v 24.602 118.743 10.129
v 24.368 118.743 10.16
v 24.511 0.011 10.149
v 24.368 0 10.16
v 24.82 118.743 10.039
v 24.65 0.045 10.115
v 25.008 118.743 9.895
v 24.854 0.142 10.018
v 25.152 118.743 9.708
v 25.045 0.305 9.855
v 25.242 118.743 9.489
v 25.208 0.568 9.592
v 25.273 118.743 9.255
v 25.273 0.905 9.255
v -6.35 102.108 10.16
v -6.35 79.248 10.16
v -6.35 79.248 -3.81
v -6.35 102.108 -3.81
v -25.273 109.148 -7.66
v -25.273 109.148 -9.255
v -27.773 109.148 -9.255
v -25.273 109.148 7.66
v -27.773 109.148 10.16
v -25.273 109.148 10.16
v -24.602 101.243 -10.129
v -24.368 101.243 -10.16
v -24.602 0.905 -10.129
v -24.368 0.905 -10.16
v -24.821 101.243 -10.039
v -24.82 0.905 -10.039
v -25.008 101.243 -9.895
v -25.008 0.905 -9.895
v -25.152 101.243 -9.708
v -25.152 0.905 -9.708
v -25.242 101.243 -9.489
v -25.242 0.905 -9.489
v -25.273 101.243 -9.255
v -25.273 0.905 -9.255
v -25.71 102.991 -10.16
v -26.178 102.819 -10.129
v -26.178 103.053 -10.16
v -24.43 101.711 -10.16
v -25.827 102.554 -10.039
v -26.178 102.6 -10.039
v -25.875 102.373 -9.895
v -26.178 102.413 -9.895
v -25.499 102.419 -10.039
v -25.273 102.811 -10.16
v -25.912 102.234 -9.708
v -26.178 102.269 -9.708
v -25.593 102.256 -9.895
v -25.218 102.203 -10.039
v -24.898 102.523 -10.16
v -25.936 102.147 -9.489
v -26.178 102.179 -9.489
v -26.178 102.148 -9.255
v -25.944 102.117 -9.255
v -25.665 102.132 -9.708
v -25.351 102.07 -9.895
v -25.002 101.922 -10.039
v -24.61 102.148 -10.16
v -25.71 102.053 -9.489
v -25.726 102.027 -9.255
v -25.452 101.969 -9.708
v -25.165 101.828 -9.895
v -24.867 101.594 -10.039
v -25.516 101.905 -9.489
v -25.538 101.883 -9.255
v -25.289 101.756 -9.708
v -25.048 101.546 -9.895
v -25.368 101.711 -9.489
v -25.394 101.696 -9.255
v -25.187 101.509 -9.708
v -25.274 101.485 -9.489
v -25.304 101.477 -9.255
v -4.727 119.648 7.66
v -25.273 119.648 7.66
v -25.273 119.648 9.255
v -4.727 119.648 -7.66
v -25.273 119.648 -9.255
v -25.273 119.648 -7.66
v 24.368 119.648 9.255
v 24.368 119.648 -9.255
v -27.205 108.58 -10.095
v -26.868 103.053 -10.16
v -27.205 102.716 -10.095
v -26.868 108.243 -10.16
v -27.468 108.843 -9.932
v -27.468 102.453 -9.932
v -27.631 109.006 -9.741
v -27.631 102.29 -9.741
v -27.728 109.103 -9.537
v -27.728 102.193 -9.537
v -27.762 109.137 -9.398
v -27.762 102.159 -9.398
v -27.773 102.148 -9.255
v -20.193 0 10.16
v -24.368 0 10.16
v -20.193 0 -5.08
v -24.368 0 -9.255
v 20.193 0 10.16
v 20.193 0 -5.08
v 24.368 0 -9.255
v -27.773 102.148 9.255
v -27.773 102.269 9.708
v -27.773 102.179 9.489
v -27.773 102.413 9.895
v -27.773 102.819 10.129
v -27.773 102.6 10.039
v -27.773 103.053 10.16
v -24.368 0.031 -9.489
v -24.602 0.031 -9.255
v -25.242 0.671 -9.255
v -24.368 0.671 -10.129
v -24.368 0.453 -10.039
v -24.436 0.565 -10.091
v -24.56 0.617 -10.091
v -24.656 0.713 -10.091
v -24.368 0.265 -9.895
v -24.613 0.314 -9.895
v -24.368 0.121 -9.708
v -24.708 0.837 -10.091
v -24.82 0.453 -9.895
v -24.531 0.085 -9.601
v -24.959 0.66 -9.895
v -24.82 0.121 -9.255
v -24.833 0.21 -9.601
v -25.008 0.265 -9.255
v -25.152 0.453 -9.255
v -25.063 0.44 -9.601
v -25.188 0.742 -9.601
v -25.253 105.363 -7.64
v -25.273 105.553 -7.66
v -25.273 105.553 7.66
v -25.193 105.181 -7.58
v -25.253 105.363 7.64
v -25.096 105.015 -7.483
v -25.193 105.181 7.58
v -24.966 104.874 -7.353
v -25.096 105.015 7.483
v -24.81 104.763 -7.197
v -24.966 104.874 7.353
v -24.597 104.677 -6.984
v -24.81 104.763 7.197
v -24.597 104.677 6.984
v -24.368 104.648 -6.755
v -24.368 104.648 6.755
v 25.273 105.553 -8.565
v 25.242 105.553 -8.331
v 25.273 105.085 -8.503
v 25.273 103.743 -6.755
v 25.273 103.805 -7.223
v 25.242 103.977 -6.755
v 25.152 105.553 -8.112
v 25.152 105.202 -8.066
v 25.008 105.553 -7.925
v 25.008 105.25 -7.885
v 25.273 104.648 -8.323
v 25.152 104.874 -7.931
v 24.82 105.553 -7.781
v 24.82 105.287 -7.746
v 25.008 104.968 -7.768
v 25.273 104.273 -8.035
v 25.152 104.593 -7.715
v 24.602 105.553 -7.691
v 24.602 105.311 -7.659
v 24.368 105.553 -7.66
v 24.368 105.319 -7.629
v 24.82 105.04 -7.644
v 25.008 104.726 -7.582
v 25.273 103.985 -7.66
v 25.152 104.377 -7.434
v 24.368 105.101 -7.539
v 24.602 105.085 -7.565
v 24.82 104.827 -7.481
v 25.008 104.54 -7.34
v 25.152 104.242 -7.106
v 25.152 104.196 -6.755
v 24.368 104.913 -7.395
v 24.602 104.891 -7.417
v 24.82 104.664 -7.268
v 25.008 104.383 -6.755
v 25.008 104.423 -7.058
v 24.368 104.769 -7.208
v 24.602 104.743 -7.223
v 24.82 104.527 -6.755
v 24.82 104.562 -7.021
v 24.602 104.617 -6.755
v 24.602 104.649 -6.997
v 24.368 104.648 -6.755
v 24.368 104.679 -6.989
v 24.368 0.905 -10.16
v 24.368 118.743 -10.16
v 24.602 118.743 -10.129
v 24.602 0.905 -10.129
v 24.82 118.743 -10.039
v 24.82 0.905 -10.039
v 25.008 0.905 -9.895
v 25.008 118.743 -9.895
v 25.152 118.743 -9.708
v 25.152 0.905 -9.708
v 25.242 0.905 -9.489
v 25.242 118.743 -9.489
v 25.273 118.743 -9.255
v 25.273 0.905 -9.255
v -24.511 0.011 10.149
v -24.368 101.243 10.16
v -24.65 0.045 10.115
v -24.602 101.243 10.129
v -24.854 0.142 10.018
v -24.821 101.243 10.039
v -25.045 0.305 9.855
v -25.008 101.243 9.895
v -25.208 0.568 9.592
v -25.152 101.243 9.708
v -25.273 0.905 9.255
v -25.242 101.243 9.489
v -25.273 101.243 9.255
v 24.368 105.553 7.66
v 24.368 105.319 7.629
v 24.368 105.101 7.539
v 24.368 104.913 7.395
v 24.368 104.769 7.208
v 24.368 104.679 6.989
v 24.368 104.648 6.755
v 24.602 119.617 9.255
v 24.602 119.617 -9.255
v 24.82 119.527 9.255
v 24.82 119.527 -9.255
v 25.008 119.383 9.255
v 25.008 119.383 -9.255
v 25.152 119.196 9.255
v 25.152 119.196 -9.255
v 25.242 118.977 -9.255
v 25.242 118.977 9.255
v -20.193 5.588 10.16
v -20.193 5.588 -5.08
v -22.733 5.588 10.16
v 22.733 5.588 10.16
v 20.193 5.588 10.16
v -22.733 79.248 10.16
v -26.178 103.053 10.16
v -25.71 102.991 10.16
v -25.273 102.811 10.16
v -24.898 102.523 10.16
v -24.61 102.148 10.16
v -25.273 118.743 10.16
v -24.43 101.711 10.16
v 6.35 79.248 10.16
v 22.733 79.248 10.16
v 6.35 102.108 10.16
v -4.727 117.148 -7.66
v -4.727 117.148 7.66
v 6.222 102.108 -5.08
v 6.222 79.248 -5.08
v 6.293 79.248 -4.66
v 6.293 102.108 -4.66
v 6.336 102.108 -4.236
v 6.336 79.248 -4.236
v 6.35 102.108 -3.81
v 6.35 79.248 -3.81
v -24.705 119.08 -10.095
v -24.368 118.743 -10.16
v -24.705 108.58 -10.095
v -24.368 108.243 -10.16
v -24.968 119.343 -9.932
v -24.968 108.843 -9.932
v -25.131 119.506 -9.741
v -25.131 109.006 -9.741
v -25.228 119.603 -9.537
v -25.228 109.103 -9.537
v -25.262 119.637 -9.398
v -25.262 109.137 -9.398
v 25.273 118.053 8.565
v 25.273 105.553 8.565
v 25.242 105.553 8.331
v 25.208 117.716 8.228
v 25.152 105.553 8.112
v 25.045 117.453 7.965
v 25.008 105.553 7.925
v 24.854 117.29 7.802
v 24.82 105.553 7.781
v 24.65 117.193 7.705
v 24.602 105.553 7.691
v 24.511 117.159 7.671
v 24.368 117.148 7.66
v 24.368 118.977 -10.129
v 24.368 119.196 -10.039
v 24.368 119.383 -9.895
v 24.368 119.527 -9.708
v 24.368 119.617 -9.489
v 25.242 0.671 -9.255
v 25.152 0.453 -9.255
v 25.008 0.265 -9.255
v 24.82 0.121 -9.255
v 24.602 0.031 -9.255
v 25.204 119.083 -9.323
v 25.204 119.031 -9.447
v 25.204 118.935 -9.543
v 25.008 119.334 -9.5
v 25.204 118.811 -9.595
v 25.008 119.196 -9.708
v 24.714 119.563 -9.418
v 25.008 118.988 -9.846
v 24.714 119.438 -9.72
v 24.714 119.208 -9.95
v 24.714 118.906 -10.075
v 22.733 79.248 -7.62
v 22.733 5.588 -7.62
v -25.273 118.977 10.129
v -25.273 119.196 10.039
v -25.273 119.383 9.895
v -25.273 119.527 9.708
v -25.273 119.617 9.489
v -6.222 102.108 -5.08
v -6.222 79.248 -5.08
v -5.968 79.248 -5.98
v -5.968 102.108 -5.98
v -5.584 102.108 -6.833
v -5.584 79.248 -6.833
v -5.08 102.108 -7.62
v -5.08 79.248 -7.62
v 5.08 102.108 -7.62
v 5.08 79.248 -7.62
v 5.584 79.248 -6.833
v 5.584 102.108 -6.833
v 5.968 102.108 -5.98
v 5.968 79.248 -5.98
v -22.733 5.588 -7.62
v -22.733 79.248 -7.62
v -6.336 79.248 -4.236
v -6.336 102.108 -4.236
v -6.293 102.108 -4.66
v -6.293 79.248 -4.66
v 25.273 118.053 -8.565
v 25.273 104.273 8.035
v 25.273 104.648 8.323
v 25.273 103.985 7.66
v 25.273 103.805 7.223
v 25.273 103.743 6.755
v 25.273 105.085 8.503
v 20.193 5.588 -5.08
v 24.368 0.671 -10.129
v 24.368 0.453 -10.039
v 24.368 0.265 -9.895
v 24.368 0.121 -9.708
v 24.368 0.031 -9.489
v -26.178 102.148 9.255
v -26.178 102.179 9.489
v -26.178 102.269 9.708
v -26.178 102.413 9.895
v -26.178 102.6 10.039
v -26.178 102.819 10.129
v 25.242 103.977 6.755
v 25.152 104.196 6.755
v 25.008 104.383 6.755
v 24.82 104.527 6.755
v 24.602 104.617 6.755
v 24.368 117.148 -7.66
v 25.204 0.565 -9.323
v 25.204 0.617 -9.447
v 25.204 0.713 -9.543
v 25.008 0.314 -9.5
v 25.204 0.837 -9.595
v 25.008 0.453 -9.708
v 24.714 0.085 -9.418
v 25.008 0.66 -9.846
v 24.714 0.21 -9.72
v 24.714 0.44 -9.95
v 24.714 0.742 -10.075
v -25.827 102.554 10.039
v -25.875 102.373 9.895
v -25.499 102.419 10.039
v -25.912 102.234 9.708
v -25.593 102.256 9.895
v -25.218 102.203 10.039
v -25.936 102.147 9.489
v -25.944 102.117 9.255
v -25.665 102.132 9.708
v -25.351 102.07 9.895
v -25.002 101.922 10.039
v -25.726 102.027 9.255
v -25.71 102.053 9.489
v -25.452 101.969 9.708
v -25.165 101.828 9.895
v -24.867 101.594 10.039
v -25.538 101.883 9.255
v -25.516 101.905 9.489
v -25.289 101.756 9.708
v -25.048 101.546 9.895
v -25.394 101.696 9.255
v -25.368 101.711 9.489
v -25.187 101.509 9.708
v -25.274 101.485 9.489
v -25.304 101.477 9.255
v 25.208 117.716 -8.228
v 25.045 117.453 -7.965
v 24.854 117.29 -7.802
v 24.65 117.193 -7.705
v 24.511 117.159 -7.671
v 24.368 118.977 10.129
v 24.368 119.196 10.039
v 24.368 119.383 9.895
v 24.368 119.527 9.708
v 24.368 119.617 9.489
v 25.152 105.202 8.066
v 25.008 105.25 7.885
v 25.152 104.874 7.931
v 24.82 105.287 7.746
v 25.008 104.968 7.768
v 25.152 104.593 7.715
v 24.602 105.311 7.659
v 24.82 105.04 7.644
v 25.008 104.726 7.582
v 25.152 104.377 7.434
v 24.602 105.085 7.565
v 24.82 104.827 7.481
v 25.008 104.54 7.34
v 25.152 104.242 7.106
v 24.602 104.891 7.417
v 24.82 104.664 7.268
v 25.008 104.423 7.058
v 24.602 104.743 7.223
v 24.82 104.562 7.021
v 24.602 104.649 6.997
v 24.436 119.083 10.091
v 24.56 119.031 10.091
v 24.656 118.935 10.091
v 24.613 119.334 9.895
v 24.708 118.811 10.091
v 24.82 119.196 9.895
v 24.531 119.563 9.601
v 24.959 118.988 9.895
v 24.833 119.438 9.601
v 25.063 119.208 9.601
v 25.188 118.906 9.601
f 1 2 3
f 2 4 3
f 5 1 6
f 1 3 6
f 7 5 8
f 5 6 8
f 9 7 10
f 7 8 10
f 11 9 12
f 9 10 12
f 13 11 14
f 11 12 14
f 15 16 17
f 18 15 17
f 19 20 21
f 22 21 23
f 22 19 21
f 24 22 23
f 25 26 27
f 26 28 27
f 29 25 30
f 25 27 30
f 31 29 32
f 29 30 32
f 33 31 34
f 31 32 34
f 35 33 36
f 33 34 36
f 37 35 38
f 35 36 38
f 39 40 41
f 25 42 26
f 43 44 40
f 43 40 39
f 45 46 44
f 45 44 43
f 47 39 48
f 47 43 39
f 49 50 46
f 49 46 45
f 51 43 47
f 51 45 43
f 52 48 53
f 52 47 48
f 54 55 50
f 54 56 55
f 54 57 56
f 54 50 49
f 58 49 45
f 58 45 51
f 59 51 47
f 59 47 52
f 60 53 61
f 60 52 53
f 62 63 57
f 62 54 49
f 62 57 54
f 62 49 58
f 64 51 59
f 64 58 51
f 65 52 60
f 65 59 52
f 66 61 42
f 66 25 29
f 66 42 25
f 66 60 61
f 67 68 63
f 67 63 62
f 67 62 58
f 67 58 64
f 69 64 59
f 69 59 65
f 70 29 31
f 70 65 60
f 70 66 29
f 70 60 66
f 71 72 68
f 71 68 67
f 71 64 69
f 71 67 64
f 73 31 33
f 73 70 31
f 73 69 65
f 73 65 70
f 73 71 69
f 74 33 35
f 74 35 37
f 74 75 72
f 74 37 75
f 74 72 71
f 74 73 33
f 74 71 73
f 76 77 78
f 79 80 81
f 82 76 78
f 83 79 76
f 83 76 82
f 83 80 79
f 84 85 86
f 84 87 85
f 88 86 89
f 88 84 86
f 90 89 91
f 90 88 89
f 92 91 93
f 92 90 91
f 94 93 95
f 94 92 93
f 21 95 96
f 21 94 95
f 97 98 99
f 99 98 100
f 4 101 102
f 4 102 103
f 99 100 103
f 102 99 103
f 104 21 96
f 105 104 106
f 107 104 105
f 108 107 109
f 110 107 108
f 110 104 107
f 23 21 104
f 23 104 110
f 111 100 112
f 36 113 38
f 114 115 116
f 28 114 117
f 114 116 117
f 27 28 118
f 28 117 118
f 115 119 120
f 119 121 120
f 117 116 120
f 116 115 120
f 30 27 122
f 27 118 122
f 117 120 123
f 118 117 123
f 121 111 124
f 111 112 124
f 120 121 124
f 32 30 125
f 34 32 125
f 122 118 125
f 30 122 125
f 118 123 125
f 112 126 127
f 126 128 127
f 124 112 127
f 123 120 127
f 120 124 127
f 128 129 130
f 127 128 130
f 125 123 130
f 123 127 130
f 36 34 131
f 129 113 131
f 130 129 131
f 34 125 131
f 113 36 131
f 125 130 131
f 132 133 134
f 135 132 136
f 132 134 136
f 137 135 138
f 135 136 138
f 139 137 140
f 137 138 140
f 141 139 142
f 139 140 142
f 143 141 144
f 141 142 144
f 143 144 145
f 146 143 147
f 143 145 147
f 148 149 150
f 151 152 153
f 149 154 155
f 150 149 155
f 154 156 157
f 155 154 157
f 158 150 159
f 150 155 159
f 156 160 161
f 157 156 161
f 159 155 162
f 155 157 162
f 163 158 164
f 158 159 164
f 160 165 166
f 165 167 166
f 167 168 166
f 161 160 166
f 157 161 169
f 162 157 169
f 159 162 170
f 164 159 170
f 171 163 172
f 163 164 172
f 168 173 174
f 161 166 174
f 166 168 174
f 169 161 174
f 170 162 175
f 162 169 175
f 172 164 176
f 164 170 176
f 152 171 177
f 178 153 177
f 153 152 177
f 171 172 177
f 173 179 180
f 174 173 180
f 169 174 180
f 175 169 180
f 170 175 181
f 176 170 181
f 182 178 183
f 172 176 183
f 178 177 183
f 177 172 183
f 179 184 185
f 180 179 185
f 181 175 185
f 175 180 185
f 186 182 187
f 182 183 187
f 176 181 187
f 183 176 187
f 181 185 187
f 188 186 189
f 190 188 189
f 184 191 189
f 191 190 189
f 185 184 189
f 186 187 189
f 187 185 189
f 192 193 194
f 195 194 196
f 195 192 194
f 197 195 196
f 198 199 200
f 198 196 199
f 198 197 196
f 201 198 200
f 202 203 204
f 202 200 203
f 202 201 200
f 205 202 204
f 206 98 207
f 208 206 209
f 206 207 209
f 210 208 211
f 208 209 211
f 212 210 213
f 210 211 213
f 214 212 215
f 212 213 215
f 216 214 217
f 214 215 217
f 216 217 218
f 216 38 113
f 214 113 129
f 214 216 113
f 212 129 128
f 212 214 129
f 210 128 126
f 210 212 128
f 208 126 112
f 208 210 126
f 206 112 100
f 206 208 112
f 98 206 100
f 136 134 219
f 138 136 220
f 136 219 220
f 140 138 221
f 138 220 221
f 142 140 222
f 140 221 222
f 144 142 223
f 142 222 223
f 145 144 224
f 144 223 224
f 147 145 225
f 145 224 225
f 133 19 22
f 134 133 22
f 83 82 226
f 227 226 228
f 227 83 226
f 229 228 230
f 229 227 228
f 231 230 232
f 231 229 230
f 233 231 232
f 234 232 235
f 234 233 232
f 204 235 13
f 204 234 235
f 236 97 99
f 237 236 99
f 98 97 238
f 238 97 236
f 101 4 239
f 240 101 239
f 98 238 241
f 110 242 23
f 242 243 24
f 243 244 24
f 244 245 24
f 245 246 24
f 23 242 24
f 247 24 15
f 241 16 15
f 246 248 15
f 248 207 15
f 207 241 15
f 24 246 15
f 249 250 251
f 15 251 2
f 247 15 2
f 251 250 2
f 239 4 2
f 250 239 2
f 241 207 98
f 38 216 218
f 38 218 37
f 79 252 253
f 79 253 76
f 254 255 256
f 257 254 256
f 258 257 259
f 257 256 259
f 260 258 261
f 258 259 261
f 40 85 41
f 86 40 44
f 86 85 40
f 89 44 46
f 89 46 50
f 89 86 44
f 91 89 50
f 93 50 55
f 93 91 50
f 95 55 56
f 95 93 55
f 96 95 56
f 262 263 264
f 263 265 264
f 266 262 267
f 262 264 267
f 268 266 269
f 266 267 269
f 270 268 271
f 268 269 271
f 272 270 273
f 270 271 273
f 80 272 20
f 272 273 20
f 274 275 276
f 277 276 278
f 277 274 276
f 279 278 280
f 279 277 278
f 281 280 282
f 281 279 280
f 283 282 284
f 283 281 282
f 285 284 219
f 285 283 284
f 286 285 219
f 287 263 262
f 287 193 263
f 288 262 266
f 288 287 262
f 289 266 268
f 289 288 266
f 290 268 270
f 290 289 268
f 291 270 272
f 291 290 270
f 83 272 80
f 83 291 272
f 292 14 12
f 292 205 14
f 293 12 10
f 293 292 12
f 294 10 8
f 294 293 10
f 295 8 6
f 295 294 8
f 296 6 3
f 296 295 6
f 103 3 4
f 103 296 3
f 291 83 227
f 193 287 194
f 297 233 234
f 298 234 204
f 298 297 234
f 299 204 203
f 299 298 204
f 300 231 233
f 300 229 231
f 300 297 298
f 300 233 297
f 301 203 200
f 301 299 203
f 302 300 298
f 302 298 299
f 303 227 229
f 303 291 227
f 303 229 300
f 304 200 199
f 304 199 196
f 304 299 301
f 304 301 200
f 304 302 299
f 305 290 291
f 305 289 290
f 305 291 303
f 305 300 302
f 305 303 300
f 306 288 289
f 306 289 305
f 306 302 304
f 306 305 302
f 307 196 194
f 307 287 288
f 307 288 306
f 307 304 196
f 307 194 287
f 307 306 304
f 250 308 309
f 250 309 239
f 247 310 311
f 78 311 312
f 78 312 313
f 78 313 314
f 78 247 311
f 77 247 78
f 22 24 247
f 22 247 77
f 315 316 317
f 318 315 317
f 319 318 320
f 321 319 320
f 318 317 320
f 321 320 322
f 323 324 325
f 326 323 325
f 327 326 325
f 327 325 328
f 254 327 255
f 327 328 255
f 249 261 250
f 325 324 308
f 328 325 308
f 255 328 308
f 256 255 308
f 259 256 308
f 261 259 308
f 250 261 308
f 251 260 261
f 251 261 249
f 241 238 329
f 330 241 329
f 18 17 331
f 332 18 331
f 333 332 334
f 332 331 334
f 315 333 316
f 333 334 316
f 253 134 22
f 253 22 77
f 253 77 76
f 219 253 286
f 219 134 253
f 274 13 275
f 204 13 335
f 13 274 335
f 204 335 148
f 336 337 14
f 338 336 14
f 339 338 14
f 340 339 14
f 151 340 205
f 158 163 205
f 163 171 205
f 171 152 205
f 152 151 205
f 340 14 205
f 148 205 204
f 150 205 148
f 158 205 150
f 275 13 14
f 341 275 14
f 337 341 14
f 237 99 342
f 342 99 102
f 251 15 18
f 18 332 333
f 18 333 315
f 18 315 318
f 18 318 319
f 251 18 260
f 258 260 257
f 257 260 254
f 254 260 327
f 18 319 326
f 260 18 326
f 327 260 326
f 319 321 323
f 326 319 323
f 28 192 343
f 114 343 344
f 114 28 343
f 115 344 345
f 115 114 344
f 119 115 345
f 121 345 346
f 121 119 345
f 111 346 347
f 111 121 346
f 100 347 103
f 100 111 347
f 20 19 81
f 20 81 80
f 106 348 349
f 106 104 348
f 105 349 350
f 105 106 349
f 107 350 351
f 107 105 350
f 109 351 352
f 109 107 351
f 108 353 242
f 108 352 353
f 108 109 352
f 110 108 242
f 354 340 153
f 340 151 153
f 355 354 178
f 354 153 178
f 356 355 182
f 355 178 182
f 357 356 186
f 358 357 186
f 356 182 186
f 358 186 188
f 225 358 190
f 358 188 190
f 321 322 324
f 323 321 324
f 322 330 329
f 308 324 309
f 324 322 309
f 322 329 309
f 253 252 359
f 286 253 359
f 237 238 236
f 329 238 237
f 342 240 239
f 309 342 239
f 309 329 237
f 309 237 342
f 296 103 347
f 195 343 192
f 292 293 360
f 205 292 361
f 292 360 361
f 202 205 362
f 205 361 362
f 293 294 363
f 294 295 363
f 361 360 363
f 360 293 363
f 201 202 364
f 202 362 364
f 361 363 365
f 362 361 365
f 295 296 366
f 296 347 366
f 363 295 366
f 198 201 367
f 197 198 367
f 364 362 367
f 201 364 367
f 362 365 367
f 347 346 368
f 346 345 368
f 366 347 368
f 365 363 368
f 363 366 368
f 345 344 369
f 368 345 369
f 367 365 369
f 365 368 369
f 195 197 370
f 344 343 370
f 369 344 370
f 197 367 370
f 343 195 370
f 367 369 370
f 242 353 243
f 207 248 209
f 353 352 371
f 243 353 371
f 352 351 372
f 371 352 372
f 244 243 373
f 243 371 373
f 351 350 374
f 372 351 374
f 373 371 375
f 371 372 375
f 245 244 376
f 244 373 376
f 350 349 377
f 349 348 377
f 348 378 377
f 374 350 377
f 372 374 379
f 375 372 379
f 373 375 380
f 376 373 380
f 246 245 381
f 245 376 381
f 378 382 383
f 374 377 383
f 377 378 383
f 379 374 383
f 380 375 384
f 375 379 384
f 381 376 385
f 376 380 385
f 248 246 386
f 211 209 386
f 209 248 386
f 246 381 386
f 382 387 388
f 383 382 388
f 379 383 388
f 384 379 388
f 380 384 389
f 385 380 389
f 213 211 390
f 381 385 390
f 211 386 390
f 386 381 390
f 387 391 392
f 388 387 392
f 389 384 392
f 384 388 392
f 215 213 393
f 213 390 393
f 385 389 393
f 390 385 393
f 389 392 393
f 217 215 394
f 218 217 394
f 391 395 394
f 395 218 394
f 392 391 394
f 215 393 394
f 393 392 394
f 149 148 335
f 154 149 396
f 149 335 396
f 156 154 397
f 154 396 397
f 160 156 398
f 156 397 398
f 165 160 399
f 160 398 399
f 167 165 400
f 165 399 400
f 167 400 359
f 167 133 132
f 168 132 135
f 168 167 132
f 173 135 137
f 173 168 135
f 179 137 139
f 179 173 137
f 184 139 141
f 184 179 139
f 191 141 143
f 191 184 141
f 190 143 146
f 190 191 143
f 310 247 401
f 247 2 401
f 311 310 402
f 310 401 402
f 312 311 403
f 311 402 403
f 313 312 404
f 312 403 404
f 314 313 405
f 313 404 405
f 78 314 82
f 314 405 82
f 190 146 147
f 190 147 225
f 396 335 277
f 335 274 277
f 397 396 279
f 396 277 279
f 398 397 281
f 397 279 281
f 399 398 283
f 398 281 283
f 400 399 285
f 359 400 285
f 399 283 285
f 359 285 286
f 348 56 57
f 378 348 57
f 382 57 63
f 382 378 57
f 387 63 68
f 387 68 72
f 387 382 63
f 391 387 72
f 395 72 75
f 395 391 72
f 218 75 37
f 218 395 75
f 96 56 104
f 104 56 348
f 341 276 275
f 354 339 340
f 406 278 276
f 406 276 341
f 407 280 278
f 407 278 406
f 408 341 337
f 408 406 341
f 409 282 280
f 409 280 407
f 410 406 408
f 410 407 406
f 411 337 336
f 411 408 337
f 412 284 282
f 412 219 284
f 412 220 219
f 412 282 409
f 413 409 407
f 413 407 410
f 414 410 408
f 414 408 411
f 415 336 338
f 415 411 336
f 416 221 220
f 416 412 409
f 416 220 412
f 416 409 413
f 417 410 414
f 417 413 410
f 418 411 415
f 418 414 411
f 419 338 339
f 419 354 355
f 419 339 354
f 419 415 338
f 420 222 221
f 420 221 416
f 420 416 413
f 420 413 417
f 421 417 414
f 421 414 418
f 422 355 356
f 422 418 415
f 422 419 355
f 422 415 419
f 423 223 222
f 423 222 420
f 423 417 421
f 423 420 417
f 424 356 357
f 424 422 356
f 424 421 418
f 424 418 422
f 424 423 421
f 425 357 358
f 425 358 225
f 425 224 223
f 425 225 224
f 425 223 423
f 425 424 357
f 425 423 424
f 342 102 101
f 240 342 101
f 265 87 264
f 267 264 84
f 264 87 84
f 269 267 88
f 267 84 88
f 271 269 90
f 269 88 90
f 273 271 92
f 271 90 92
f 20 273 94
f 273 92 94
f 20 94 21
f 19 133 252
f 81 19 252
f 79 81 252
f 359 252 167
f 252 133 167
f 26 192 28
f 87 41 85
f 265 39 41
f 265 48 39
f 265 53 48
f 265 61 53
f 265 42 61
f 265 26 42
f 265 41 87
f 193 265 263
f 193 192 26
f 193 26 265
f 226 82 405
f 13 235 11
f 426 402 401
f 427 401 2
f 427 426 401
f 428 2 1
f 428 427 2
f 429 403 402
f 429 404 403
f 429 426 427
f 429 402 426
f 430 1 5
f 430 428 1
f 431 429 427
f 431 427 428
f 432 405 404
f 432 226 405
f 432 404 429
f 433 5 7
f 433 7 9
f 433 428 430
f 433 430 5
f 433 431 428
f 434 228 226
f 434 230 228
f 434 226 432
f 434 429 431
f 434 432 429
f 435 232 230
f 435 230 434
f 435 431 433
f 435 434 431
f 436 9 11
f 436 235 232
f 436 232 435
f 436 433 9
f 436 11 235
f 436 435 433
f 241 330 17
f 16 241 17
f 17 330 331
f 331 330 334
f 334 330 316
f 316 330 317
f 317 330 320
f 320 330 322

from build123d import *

# Parameters (mm, degrees)
SKETCH1_W            = 2.54
SKETCH1_H            = 2.54
BOSS_EXTRUDE3_DEPTH  = 5.588
BOSS_EXTRUDE4_START  = 5.588
BOSS_EXTRUDE4_DEPTH  = 73.66
BOSS_EXTRUDE6_START  = 79.248
SKETCH1_8_W          = 2.54
SKETCH1_8_H          = 2.54
SKETCH1_8_W_2        = 13.843
BOSS_EXTRUDE6_DEPTH  = 22.86
BOSS_EXTRUDE7_START  = 102.108
SKETCH1_9_W          = 12.7
SKETCH1_9_H          = 2.54
SKETCH1_9_W_2        = 2.54
SKETCH1_9_W_3        = 13.843
BOSS_EXTRUDE7_DEPTH  = 2.54
SKETCH2_W            = 50.546
SKETCH2_H            = 2.5
BOSS_EXTRUDE8_DEPTH  = 15
BOSS_EXTRUDE9_REACH  = 19.82
SKETCH3_W            = 30
SKETCH3_H            = 2.5
SKETCH4_W            = 20.32
SKETCH4_H            = 7
BOSS_EXTRUDE10_DEPTH = 2.5
FILLET1_R            = 0.905


with BuildPart() as part:
    # Sketch1 → Boss-Extrude3 (new body)
    with BuildSketch(Plane(origin=(0, 0, 0), x_dir=(1, 0, 0), z_dir=(0, 1, 0))):
        with BuildLine():
            Line((-22.733, -10.16), (-22.733, -7.62))
            Line((-22.733, -7.62), (-22.733, 7.62))
            Line((-22.733, 7.62), (-5.08, 7.62))
            ThreePointArc((-5.08, 7.62), (-2.839806331, 9.489612663), (0, 10.16))
            Line((0, 10.16), (-25.273, 10.16))
            Line((-25.273, 10.16), (-25.273, -10.16))
            Line((-25.273, -10.16), (-22.733, -10.16))
        make_face()
        with BuildLine():
            ThreePointArc((0, 10.16), (2.839806331, 9.489612663), (5.08, 7.62))
            Line((5.08, 7.62), (22.733, 7.62))
            Line((22.733, 7.62), (22.733, -7.62))
            Line((22.733, -7.62), (22.733, -10.16))
            Line((22.733, -10.16), (25.273, -10.16))
            Line((25.273, -10.16), (25.273, 10.16))
            Line((25.273, 10.16), (0, 10.16))
        make_face()
        with BuildLine():
            ThreePointArc((0, 10.16), (-2.839806331, 9.489612663), (-5.08, 7.62))
            Line((-5.08, 7.62), (5.08, 7.62))
            ThreePointArc((5.08, 7.62), (2.839806331, 9.489612663), (0, 10.16))
        make_face()
        with BuildLine():
            Line((-22.733, 7.62), (-22.733, -7.62))
            Line((-22.733, -7.62), (-20.193, -7.62))
            Line((-20.193, -7.62), (-20.193, -5.08))
            Line((-20.193, -5.08), (-20.193, 5.08))
            Line((-20.193, 5.08), (-6.221703947, 5.08))
            ThreePointArc((-6.221703947, 5.08), (-5.791806974, 6.413357827), (-5.08, 7.62))
            Line((-5.08, 7.62), (-22.733, 7.62))
        make_face()
        with Locations((-21.463, -8.89)):
            Rectangle(SKETCH1_W, SKETCH1_H)
        with BuildLine():
            Line((5.08, 7.62), (-5.08, 7.62))
            ThreePointArc((-5.08, 7.62), (-5.791806974, 6.413357827), (-6.221703947, 5.08))
            Line((-6.221703947, 5.08), (6.221703947, 5.08))
            ThreePointArc((6.221703947, 5.08), (5.791806974, 6.413357827), (5.08, 7.62))
        make_face()
        with BuildLine():
            Line((22.733, 7.62), (5.08, 7.62))
            ThreePointArc((5.08, 7.62), (5.791806974, 6.413357827), (6.221703947, 5.08))
            Line((6.221703947, 5.08), (20.193, 5.08))
            Line((20.193, 5.08), (20.193, -5.08))
            Line((20.193, -5.08), (20.193, -7.62))
            Line((20.193, -7.62), (22.733, -7.62))
            Line((22.733, -7.62), (22.733, 7.62))
        make_face()
        with Locations((21.463, -8.89)):
            Rectangle(SKETCH1_W, SKETCH1_H)
    extrude(amount=BOSS_EXTRUDE3_DEPTH)

    # Sketch1<7> → Boss-Extrude4 (add)
    with BuildSketch(Plane(origin=(0, 0, 0), x_dir=(1, 0, 0), z_dir=(0, 1, 0)).offset(BOSS_EXTRUDE4_START)):
        with BuildLine():
            Line((-22.733, -10.16), (-22.733, -7.62))
            Line((-22.733, -7.62), (-22.733, 7.62))
            Line((-22.733, 7.62), (-5.08, 7.62))
            ThreePointArc((-5.08, 7.62), (-2.839806331, 9.489612663), (0, 10.16))
            Line((0, 10.16), (-25.273, 10.16))
            Line((-25.273, 10.16), (-25.273, -10.16))
            Line((-25.273, -10.16), (-22.733, -10.16))
        make_face()
        with BuildLine():
            ThreePointArc((0, 10.16), (2.839806331, 9.489612663), (5.08, 7.62))
            Line((5.08, 7.62), (22.733, 7.62))
            Line((22.733, 7.62), (22.733, -7.62))
            Line((22.733, -7.62), (22.733, -10.16))
            Line((22.733, -10.16), (25.273, -10.16))
            Line((25.273, -10.16), (25.273, 10.16))
            Line((25.273, 10.16), (0, 10.16))
        make_face()
        with BuildLine():
            ThreePointArc((0, 10.16), (-2.839806331, 9.489612663), (-5.08, 7.62))
            Line((-5.08, 7.62), (5.08, 7.62))
            ThreePointArc((5.08, 7.62), (2.839806331, 9.489612663), (0, 10.16))
        make_face()
    extrude(amount=BOSS_EXTRUDE4_DEPTH)

    # Sketch1<8> → Boss-Extrude6 (add)
    with BuildSketch(Plane(origin=(0, 0, 0), x_dir=(1, 0, 0), z_dir=(0, 1, 0)).offset(BOSS_EXTRUDE6_START)):
        with BuildLine():
            Line((-22.733, -10.16), (-22.733, -7.62))
            Line((-22.733, -7.62), (-22.733, 7.62))
            Line((-22.733, 7.62), (-5.08, 7.62))
            ThreePointArc((-5.08, 7.62), (-2.839806331, 9.489612663), (0, 10.16))
            Line((0, 10.16), (-25.273, 10.16))
            Line((-25.273, 10.16), (-25.273, -10.16))
            Line((-25.273, -10.16), (-22.733, -10.16))
        make_face()
        with BuildLine():
            Line((-22.733, 7.62), (-22.733, -7.62))
            Line((-22.733, -7.62), (-20.193, -7.62))
            Line((-20.193, -7.62), (-20.193, -5.08))
            Line((-20.193, -5.08), (-20.193, 5.08))
            Line((-20.193, 5.08), (-6.221703947, 5.08))
            ThreePointArc((-6.221703947, 5.08), (-5.791806974, 6.413357827), (-5.08, 7.62))
            Line((-5.08, 7.62), (-22.733, 7.62))
        make_face()
        with BuildLine():
            Line((-20.193, -5.08), (-20.193, -7.62))
            Line((-20.193, -7.62), (-6.35, -7.62))
            Line((-6.35, -7.62), (-6.35, -3.175))
            Line((-6.35, -3.175), (-6.35, 3.81))
            ThreePointArc((-6.35, 3.81), (-6.317844572, 4.448231909), (-6.221703947, 5.08))
            Line((-6.221703947, 5.08), (-20.193, 5.08))
            Line((-20.193, 5.08), (-20.193, -5.08))
        make_face()
        with Locations((-21.463, -8.89)):
            Rectangle(SKETCH1_8_W, SKETCH1_8_H)
        with Locations((-13.2715, -8.89)):
            Rectangle(SKETCH1_8_W_2, SKETCH1_8_H)
        with BuildLine():
            ThreePointArc((0, 10.16), (2.839806331, 9.489612663), (5.08, 7.62))
            Line((5.08, 7.62), (22.733, 7.62))
            Line((22.733, 7.62), (22.733, -7.62))
            Line((22.733, -7.62), (22.733, -10.16))
            Line((22.733, -10.16), (25.273, -10.16))
            Line((25.273, -10.16), (25.273, 10.16))
            Line((25.273, 10.16), (0, 10.16))
        make_face()
        with BuildLine():
            Line((22.733, 7.62), (5.08, 7.62))
            ThreePointArc((5.08, 7.62), (5.791806974, 6.413357827), (6.221703947, 5.08))
            Line((6.221703947, 5.08), (20.193, 5.08))
            Line((20.193, 5.08), (20.193, -5.08))
            Line((20.193, -5.08), (20.193, -7.62))
            Line((20.193, -7.62), (22.733, -7.62))
            Line((22.733, -7.62), (22.733, 7.62))
        make_face()
        with BuildLine():
            Line((6.35, -3.175), (6.35, -7.62))
            Line((6.35, -7.62), (20.193, -7.62))
            Line((20.193, -7.62), (20.193, -5.08))
            Line((20.193, -5.08), (20.193, 5.08))
            Line((20.193, 5.08), (6.221703947, 5.08))
            ThreePointArc((6.221703947, 5.08), (6.317844572, 4.448231909), (6.35, 3.81))
            Line((6.35, 3.81), (6.35, -3.175))
        make_face()
        with Locations((13.2715, -8.89)):
            Rectangle(SKETCH1_8_W_2, SKETCH1_8_H)
        with Locations((21.463, -8.89)):
            Rectangle(SKETCH1_8_W, SKETCH1_8_H)
        with BuildLine():
            ThreePointArc((0, 10.16), (-2.839806331, 9.489612663), (-5.08, 7.62))
            Line((-5.08, 7.62), (5.08, 7.62))
            ThreePointArc((5.08, 7.62), (2.839806331, 9.489612663), (0, 10.16))
        make_face()
    extrude(amount=BOSS_EXTRUDE6_DEPTH)

    # Sketch1<9> → Boss-Extrude7 (add)
    with BuildSketch(Plane(origin=(0, 0, 0), x_dir=(1, 0, 0), z_dir=(0, 1, 0)).offset(BOSS_EXTRUDE7_START)):
        with BuildLine():
            Line((-6.35, -3.175), (-6.35, -7.62))
            Line((-6.35, -7.62), (6.35, -7.62))
            Line((6.35, -7.62), (6.35, -3.175))
            Line((6.35, -3.175), (6.35, 3.81))
            ThreePointArc((6.35, 3.81), (6.317844572, 4.448231909), (6.221703947, 5.08))
            Line((6.221703947, 5.08), (-6.221703947, 5.08))
            ThreePointArc((-6.221703947, 5.08), (-6.317844572, 4.448231909), (-6.35, 3.81))
            Line((-6.35, 3.81), (-6.35, -3.175))
        make_face()
        with Locations((0, -8.89)):
            Rectangle(SKETCH1_9_W, SKETCH1_9_H)
        with BuildLine():
            Line((5.08, 7.62), (-5.08, 7.62))
            ThreePointArc((-5.08, 7.62), (-5.791806974, 6.413357827), (-6.221703947, 5.08))
            Line((-6.221703947, 5.08), (6.221703947, 5.08))
            ThreePointArc((6.221703947, 5.08), (5.791806974, 6.413357827), (5.08, 7.62))
        make_face()
        with BuildLine():
            Line((-22.733, -10.16), (-22.733, -7.62))
            Line((-22.733, -7.62), (-22.733, 7.62))
            Line((-22.733, 7.62), (-5.08, 7.62))
            ThreePointArc((-5.08, 7.62), (-2.839806331, 9.489612663), (0, 10.16))
            Line((0, 10.16), (-25.273, 10.16))
            Line((-25.273, 10.16), (-25.273, -10.16))
            Line((-25.273, -10.16), (-22.733, -10.16))
        make_face()
        with Locations((-21.463, -8.89)):
            Rectangle(SKETCH1_9_W_2, SKETCH1_9_H)
        with BuildLine():
            Line((-22.733, 7.62), (-22.733, -7.62))
            Line((-22.733, -7.62), (-20.193, -7.62))
            Line((-20.193, -7.62), (-20.193, -5.08))
            Line((-20.193, -5.08), (-20.193, 5.08))
            Line((-20.193, 5.08), (-6.221703947, 5.08))
            ThreePointArc((-6.221703947, 5.08), (-5.791806974, 6.413357827), (-5.08, 7.62))
            Line((-5.08, 7.62), (-22.733, 7.62))
        make_face()
        with Locations((-13.2715, -8.89)):
            Rectangle(SKETCH1_9_W_3, SKETCH1_9_H)
        with BuildLine():
            Line((-20.193, -5.08), (-20.193, -7.62))
            Line((-20.193, -7.62), (-6.35, -7.62))
            Line((-6.35, -7.62), (-6.35, -3.175))
            Line((-6.35, -3.175), (-6.35, 3.81))
            ThreePointArc((-6.35, 3.81), (-6.317844572, 4.448231909), (-6.221703947, 5.08))
            Line((-6.221703947, 5.08), (-20.193, 5.08))
            Line((-20.193, 5.08), (-20.193, -5.08))
        make_face()
        with BuildLine():
            ThreePointArc((0, 10.16), (-2.839806331, 9.489612663), (-5.08, 7.62))
            Line((-5.08, 7.62), (5.08, 7.62))
            ThreePointArc((5.08, 7.62), (2.839806331, 9.489612663), (0, 10.16))
        make_face()
        with BuildLine():
            Line((22.733, 7.62), (5.08, 7.62))
            ThreePointArc((5.08, 7.62), (5.791806974, 6.413357827), (6.221703947, 5.08))
            Line((6.221703947, 5.08), (20.193, 5.08))
            Line((20.193, 5.08), (20.193, -5.08))
            Line((20.193, -5.08), (20.193, -7.62))
            Line((20.193, -7.62), (22.733, -7.62))
            Line((22.733, -7.62), (22.733, 7.62))
        make_face()
        with BuildLine():
            ThreePointArc((0, 10.16), (2.839806331, 9.489612663), (5.08, 7.62))
            Line((5.08, 7.62), (22.733, 7.62))
            Line((22.733, 7.62), (22.733, -7.62))
            Line((22.733, -7.62), (22.733, -10.16))
            Line((22.733, -10.16), (25.273, -10.16))
            Line((25.273, -10.16), (25.273, 10.16))
            Line((25.273, 10.16), (0, 10.16))
        make_face()
        with BuildLine():
            Line((6.35, -3.175), (6.35, -7.62))
            Line((6.35, -7.62), (20.193, -7.62))
            Line((20.193, -7.62), (20.193, -5.08))
            Line((20.193, -5.08), (20.193, 5.08))
            Line((20.193, 5.08), (6.221703947, 5.08))
            ThreePointArc((6.221703947, 5.08), (6.317844572, 4.448231909), (6.35, 3.81))
            Line((6.35, 3.81), (6.35, -3.175))
        make_face()
        with Locations((13.2715, -8.89)):
            Rectangle(SKETCH1_9_W_3, SKETCH1_9_H)
        with Locations((21.463, -8.89)):
            Rectangle(SKETCH1_9_W_2, SKETCH1_9_H)
    extrude(amount=BOSS_EXTRUDE7_DEPTH)

    # Sketch2 → Boss-Extrude8 (add)
    with BuildSketch(Plane(origin=(0, 104.648, 0), x_dir=(1, 0, 0), z_dir=(0, 1, 0))):
        with Locations((0, 8.91)):
            Rectangle(SKETCH2_W, SKETCH2_H)
        with Locations((0, -8.91)):
            Rectangle(SKETCH2_W, SKETCH2_H)
    extrude(amount=BOSS_EXTRUDE8_DEPTH)

    # Sketch3 → Boss-Extrude9 (add, up to next)
    with BuildSketch(Plane.XY.offset(-7.66), mode=Mode.PRIVATE) as boss_extrude9_sk1:
        with Locations((10.273, 118.398)):
            Rectangle(SKETCH3_W, SKETCH3_H)
    boss_extrude9_tool1 = extrude(boss_extrude9_sk1.sketch, amount=BOSS_EXTRUDE9_REACH, mode=Mode.PRIVATE) - part.part
    add(boss_extrude9_tool1.solids().sort_by_distance((10.273, 118.398, -7.66))[0])

    # Sketch4 → Boss-Extrude10 (add)
    with BuildSketch(Plane.ZY.offset(25.273)):
        with Locations((0, 105.648)):
            Rectangle(SKETCH4_W, SKETCH4_H)
    extrude(amount=BOSS_EXTRUDE10_DEPTH)

    # Fillet1
    fillet1_edges = [part.edges().sort_by_distance(p)[0] for p in [
        (-25.273, 104.648, 0),
        (25.273, 104.648, 0),
        (0, 104.648, -7.66),
        (0, 119.648, -10.16),
        (25.273, 119.648, 0),
        (0, 104.648, 7.66),
        (0, 119.648, 10.16),
        (-25.273, 0, 0),
        (0, 0, -10.16),
        (25.273, 0, 0),
        (25.273, 110.898, -7.66),
        (25.273, 110.898, 7.66),
        (25.273, 117.148, 0),
        (-25.273, 51.074, 10.16),
        (-25.273, 51.074, -10.16),
        (-26.523, 109.148, -10.16),
        (-25.273, 102.148, 0),
        (-26.523, 102.148, -10.16),
        (-26.523, 102.148, 10.16),
        (-27.773, 105.648, -10.16),
        (-25.273, 114.398, -10.16),
        (25.273, 59.824, -10.16),
        (25.273, 59.824, 10.16),
    ]]
    fillet(fillet1_edges, radius=FILLET1_R)


solid = part.part
